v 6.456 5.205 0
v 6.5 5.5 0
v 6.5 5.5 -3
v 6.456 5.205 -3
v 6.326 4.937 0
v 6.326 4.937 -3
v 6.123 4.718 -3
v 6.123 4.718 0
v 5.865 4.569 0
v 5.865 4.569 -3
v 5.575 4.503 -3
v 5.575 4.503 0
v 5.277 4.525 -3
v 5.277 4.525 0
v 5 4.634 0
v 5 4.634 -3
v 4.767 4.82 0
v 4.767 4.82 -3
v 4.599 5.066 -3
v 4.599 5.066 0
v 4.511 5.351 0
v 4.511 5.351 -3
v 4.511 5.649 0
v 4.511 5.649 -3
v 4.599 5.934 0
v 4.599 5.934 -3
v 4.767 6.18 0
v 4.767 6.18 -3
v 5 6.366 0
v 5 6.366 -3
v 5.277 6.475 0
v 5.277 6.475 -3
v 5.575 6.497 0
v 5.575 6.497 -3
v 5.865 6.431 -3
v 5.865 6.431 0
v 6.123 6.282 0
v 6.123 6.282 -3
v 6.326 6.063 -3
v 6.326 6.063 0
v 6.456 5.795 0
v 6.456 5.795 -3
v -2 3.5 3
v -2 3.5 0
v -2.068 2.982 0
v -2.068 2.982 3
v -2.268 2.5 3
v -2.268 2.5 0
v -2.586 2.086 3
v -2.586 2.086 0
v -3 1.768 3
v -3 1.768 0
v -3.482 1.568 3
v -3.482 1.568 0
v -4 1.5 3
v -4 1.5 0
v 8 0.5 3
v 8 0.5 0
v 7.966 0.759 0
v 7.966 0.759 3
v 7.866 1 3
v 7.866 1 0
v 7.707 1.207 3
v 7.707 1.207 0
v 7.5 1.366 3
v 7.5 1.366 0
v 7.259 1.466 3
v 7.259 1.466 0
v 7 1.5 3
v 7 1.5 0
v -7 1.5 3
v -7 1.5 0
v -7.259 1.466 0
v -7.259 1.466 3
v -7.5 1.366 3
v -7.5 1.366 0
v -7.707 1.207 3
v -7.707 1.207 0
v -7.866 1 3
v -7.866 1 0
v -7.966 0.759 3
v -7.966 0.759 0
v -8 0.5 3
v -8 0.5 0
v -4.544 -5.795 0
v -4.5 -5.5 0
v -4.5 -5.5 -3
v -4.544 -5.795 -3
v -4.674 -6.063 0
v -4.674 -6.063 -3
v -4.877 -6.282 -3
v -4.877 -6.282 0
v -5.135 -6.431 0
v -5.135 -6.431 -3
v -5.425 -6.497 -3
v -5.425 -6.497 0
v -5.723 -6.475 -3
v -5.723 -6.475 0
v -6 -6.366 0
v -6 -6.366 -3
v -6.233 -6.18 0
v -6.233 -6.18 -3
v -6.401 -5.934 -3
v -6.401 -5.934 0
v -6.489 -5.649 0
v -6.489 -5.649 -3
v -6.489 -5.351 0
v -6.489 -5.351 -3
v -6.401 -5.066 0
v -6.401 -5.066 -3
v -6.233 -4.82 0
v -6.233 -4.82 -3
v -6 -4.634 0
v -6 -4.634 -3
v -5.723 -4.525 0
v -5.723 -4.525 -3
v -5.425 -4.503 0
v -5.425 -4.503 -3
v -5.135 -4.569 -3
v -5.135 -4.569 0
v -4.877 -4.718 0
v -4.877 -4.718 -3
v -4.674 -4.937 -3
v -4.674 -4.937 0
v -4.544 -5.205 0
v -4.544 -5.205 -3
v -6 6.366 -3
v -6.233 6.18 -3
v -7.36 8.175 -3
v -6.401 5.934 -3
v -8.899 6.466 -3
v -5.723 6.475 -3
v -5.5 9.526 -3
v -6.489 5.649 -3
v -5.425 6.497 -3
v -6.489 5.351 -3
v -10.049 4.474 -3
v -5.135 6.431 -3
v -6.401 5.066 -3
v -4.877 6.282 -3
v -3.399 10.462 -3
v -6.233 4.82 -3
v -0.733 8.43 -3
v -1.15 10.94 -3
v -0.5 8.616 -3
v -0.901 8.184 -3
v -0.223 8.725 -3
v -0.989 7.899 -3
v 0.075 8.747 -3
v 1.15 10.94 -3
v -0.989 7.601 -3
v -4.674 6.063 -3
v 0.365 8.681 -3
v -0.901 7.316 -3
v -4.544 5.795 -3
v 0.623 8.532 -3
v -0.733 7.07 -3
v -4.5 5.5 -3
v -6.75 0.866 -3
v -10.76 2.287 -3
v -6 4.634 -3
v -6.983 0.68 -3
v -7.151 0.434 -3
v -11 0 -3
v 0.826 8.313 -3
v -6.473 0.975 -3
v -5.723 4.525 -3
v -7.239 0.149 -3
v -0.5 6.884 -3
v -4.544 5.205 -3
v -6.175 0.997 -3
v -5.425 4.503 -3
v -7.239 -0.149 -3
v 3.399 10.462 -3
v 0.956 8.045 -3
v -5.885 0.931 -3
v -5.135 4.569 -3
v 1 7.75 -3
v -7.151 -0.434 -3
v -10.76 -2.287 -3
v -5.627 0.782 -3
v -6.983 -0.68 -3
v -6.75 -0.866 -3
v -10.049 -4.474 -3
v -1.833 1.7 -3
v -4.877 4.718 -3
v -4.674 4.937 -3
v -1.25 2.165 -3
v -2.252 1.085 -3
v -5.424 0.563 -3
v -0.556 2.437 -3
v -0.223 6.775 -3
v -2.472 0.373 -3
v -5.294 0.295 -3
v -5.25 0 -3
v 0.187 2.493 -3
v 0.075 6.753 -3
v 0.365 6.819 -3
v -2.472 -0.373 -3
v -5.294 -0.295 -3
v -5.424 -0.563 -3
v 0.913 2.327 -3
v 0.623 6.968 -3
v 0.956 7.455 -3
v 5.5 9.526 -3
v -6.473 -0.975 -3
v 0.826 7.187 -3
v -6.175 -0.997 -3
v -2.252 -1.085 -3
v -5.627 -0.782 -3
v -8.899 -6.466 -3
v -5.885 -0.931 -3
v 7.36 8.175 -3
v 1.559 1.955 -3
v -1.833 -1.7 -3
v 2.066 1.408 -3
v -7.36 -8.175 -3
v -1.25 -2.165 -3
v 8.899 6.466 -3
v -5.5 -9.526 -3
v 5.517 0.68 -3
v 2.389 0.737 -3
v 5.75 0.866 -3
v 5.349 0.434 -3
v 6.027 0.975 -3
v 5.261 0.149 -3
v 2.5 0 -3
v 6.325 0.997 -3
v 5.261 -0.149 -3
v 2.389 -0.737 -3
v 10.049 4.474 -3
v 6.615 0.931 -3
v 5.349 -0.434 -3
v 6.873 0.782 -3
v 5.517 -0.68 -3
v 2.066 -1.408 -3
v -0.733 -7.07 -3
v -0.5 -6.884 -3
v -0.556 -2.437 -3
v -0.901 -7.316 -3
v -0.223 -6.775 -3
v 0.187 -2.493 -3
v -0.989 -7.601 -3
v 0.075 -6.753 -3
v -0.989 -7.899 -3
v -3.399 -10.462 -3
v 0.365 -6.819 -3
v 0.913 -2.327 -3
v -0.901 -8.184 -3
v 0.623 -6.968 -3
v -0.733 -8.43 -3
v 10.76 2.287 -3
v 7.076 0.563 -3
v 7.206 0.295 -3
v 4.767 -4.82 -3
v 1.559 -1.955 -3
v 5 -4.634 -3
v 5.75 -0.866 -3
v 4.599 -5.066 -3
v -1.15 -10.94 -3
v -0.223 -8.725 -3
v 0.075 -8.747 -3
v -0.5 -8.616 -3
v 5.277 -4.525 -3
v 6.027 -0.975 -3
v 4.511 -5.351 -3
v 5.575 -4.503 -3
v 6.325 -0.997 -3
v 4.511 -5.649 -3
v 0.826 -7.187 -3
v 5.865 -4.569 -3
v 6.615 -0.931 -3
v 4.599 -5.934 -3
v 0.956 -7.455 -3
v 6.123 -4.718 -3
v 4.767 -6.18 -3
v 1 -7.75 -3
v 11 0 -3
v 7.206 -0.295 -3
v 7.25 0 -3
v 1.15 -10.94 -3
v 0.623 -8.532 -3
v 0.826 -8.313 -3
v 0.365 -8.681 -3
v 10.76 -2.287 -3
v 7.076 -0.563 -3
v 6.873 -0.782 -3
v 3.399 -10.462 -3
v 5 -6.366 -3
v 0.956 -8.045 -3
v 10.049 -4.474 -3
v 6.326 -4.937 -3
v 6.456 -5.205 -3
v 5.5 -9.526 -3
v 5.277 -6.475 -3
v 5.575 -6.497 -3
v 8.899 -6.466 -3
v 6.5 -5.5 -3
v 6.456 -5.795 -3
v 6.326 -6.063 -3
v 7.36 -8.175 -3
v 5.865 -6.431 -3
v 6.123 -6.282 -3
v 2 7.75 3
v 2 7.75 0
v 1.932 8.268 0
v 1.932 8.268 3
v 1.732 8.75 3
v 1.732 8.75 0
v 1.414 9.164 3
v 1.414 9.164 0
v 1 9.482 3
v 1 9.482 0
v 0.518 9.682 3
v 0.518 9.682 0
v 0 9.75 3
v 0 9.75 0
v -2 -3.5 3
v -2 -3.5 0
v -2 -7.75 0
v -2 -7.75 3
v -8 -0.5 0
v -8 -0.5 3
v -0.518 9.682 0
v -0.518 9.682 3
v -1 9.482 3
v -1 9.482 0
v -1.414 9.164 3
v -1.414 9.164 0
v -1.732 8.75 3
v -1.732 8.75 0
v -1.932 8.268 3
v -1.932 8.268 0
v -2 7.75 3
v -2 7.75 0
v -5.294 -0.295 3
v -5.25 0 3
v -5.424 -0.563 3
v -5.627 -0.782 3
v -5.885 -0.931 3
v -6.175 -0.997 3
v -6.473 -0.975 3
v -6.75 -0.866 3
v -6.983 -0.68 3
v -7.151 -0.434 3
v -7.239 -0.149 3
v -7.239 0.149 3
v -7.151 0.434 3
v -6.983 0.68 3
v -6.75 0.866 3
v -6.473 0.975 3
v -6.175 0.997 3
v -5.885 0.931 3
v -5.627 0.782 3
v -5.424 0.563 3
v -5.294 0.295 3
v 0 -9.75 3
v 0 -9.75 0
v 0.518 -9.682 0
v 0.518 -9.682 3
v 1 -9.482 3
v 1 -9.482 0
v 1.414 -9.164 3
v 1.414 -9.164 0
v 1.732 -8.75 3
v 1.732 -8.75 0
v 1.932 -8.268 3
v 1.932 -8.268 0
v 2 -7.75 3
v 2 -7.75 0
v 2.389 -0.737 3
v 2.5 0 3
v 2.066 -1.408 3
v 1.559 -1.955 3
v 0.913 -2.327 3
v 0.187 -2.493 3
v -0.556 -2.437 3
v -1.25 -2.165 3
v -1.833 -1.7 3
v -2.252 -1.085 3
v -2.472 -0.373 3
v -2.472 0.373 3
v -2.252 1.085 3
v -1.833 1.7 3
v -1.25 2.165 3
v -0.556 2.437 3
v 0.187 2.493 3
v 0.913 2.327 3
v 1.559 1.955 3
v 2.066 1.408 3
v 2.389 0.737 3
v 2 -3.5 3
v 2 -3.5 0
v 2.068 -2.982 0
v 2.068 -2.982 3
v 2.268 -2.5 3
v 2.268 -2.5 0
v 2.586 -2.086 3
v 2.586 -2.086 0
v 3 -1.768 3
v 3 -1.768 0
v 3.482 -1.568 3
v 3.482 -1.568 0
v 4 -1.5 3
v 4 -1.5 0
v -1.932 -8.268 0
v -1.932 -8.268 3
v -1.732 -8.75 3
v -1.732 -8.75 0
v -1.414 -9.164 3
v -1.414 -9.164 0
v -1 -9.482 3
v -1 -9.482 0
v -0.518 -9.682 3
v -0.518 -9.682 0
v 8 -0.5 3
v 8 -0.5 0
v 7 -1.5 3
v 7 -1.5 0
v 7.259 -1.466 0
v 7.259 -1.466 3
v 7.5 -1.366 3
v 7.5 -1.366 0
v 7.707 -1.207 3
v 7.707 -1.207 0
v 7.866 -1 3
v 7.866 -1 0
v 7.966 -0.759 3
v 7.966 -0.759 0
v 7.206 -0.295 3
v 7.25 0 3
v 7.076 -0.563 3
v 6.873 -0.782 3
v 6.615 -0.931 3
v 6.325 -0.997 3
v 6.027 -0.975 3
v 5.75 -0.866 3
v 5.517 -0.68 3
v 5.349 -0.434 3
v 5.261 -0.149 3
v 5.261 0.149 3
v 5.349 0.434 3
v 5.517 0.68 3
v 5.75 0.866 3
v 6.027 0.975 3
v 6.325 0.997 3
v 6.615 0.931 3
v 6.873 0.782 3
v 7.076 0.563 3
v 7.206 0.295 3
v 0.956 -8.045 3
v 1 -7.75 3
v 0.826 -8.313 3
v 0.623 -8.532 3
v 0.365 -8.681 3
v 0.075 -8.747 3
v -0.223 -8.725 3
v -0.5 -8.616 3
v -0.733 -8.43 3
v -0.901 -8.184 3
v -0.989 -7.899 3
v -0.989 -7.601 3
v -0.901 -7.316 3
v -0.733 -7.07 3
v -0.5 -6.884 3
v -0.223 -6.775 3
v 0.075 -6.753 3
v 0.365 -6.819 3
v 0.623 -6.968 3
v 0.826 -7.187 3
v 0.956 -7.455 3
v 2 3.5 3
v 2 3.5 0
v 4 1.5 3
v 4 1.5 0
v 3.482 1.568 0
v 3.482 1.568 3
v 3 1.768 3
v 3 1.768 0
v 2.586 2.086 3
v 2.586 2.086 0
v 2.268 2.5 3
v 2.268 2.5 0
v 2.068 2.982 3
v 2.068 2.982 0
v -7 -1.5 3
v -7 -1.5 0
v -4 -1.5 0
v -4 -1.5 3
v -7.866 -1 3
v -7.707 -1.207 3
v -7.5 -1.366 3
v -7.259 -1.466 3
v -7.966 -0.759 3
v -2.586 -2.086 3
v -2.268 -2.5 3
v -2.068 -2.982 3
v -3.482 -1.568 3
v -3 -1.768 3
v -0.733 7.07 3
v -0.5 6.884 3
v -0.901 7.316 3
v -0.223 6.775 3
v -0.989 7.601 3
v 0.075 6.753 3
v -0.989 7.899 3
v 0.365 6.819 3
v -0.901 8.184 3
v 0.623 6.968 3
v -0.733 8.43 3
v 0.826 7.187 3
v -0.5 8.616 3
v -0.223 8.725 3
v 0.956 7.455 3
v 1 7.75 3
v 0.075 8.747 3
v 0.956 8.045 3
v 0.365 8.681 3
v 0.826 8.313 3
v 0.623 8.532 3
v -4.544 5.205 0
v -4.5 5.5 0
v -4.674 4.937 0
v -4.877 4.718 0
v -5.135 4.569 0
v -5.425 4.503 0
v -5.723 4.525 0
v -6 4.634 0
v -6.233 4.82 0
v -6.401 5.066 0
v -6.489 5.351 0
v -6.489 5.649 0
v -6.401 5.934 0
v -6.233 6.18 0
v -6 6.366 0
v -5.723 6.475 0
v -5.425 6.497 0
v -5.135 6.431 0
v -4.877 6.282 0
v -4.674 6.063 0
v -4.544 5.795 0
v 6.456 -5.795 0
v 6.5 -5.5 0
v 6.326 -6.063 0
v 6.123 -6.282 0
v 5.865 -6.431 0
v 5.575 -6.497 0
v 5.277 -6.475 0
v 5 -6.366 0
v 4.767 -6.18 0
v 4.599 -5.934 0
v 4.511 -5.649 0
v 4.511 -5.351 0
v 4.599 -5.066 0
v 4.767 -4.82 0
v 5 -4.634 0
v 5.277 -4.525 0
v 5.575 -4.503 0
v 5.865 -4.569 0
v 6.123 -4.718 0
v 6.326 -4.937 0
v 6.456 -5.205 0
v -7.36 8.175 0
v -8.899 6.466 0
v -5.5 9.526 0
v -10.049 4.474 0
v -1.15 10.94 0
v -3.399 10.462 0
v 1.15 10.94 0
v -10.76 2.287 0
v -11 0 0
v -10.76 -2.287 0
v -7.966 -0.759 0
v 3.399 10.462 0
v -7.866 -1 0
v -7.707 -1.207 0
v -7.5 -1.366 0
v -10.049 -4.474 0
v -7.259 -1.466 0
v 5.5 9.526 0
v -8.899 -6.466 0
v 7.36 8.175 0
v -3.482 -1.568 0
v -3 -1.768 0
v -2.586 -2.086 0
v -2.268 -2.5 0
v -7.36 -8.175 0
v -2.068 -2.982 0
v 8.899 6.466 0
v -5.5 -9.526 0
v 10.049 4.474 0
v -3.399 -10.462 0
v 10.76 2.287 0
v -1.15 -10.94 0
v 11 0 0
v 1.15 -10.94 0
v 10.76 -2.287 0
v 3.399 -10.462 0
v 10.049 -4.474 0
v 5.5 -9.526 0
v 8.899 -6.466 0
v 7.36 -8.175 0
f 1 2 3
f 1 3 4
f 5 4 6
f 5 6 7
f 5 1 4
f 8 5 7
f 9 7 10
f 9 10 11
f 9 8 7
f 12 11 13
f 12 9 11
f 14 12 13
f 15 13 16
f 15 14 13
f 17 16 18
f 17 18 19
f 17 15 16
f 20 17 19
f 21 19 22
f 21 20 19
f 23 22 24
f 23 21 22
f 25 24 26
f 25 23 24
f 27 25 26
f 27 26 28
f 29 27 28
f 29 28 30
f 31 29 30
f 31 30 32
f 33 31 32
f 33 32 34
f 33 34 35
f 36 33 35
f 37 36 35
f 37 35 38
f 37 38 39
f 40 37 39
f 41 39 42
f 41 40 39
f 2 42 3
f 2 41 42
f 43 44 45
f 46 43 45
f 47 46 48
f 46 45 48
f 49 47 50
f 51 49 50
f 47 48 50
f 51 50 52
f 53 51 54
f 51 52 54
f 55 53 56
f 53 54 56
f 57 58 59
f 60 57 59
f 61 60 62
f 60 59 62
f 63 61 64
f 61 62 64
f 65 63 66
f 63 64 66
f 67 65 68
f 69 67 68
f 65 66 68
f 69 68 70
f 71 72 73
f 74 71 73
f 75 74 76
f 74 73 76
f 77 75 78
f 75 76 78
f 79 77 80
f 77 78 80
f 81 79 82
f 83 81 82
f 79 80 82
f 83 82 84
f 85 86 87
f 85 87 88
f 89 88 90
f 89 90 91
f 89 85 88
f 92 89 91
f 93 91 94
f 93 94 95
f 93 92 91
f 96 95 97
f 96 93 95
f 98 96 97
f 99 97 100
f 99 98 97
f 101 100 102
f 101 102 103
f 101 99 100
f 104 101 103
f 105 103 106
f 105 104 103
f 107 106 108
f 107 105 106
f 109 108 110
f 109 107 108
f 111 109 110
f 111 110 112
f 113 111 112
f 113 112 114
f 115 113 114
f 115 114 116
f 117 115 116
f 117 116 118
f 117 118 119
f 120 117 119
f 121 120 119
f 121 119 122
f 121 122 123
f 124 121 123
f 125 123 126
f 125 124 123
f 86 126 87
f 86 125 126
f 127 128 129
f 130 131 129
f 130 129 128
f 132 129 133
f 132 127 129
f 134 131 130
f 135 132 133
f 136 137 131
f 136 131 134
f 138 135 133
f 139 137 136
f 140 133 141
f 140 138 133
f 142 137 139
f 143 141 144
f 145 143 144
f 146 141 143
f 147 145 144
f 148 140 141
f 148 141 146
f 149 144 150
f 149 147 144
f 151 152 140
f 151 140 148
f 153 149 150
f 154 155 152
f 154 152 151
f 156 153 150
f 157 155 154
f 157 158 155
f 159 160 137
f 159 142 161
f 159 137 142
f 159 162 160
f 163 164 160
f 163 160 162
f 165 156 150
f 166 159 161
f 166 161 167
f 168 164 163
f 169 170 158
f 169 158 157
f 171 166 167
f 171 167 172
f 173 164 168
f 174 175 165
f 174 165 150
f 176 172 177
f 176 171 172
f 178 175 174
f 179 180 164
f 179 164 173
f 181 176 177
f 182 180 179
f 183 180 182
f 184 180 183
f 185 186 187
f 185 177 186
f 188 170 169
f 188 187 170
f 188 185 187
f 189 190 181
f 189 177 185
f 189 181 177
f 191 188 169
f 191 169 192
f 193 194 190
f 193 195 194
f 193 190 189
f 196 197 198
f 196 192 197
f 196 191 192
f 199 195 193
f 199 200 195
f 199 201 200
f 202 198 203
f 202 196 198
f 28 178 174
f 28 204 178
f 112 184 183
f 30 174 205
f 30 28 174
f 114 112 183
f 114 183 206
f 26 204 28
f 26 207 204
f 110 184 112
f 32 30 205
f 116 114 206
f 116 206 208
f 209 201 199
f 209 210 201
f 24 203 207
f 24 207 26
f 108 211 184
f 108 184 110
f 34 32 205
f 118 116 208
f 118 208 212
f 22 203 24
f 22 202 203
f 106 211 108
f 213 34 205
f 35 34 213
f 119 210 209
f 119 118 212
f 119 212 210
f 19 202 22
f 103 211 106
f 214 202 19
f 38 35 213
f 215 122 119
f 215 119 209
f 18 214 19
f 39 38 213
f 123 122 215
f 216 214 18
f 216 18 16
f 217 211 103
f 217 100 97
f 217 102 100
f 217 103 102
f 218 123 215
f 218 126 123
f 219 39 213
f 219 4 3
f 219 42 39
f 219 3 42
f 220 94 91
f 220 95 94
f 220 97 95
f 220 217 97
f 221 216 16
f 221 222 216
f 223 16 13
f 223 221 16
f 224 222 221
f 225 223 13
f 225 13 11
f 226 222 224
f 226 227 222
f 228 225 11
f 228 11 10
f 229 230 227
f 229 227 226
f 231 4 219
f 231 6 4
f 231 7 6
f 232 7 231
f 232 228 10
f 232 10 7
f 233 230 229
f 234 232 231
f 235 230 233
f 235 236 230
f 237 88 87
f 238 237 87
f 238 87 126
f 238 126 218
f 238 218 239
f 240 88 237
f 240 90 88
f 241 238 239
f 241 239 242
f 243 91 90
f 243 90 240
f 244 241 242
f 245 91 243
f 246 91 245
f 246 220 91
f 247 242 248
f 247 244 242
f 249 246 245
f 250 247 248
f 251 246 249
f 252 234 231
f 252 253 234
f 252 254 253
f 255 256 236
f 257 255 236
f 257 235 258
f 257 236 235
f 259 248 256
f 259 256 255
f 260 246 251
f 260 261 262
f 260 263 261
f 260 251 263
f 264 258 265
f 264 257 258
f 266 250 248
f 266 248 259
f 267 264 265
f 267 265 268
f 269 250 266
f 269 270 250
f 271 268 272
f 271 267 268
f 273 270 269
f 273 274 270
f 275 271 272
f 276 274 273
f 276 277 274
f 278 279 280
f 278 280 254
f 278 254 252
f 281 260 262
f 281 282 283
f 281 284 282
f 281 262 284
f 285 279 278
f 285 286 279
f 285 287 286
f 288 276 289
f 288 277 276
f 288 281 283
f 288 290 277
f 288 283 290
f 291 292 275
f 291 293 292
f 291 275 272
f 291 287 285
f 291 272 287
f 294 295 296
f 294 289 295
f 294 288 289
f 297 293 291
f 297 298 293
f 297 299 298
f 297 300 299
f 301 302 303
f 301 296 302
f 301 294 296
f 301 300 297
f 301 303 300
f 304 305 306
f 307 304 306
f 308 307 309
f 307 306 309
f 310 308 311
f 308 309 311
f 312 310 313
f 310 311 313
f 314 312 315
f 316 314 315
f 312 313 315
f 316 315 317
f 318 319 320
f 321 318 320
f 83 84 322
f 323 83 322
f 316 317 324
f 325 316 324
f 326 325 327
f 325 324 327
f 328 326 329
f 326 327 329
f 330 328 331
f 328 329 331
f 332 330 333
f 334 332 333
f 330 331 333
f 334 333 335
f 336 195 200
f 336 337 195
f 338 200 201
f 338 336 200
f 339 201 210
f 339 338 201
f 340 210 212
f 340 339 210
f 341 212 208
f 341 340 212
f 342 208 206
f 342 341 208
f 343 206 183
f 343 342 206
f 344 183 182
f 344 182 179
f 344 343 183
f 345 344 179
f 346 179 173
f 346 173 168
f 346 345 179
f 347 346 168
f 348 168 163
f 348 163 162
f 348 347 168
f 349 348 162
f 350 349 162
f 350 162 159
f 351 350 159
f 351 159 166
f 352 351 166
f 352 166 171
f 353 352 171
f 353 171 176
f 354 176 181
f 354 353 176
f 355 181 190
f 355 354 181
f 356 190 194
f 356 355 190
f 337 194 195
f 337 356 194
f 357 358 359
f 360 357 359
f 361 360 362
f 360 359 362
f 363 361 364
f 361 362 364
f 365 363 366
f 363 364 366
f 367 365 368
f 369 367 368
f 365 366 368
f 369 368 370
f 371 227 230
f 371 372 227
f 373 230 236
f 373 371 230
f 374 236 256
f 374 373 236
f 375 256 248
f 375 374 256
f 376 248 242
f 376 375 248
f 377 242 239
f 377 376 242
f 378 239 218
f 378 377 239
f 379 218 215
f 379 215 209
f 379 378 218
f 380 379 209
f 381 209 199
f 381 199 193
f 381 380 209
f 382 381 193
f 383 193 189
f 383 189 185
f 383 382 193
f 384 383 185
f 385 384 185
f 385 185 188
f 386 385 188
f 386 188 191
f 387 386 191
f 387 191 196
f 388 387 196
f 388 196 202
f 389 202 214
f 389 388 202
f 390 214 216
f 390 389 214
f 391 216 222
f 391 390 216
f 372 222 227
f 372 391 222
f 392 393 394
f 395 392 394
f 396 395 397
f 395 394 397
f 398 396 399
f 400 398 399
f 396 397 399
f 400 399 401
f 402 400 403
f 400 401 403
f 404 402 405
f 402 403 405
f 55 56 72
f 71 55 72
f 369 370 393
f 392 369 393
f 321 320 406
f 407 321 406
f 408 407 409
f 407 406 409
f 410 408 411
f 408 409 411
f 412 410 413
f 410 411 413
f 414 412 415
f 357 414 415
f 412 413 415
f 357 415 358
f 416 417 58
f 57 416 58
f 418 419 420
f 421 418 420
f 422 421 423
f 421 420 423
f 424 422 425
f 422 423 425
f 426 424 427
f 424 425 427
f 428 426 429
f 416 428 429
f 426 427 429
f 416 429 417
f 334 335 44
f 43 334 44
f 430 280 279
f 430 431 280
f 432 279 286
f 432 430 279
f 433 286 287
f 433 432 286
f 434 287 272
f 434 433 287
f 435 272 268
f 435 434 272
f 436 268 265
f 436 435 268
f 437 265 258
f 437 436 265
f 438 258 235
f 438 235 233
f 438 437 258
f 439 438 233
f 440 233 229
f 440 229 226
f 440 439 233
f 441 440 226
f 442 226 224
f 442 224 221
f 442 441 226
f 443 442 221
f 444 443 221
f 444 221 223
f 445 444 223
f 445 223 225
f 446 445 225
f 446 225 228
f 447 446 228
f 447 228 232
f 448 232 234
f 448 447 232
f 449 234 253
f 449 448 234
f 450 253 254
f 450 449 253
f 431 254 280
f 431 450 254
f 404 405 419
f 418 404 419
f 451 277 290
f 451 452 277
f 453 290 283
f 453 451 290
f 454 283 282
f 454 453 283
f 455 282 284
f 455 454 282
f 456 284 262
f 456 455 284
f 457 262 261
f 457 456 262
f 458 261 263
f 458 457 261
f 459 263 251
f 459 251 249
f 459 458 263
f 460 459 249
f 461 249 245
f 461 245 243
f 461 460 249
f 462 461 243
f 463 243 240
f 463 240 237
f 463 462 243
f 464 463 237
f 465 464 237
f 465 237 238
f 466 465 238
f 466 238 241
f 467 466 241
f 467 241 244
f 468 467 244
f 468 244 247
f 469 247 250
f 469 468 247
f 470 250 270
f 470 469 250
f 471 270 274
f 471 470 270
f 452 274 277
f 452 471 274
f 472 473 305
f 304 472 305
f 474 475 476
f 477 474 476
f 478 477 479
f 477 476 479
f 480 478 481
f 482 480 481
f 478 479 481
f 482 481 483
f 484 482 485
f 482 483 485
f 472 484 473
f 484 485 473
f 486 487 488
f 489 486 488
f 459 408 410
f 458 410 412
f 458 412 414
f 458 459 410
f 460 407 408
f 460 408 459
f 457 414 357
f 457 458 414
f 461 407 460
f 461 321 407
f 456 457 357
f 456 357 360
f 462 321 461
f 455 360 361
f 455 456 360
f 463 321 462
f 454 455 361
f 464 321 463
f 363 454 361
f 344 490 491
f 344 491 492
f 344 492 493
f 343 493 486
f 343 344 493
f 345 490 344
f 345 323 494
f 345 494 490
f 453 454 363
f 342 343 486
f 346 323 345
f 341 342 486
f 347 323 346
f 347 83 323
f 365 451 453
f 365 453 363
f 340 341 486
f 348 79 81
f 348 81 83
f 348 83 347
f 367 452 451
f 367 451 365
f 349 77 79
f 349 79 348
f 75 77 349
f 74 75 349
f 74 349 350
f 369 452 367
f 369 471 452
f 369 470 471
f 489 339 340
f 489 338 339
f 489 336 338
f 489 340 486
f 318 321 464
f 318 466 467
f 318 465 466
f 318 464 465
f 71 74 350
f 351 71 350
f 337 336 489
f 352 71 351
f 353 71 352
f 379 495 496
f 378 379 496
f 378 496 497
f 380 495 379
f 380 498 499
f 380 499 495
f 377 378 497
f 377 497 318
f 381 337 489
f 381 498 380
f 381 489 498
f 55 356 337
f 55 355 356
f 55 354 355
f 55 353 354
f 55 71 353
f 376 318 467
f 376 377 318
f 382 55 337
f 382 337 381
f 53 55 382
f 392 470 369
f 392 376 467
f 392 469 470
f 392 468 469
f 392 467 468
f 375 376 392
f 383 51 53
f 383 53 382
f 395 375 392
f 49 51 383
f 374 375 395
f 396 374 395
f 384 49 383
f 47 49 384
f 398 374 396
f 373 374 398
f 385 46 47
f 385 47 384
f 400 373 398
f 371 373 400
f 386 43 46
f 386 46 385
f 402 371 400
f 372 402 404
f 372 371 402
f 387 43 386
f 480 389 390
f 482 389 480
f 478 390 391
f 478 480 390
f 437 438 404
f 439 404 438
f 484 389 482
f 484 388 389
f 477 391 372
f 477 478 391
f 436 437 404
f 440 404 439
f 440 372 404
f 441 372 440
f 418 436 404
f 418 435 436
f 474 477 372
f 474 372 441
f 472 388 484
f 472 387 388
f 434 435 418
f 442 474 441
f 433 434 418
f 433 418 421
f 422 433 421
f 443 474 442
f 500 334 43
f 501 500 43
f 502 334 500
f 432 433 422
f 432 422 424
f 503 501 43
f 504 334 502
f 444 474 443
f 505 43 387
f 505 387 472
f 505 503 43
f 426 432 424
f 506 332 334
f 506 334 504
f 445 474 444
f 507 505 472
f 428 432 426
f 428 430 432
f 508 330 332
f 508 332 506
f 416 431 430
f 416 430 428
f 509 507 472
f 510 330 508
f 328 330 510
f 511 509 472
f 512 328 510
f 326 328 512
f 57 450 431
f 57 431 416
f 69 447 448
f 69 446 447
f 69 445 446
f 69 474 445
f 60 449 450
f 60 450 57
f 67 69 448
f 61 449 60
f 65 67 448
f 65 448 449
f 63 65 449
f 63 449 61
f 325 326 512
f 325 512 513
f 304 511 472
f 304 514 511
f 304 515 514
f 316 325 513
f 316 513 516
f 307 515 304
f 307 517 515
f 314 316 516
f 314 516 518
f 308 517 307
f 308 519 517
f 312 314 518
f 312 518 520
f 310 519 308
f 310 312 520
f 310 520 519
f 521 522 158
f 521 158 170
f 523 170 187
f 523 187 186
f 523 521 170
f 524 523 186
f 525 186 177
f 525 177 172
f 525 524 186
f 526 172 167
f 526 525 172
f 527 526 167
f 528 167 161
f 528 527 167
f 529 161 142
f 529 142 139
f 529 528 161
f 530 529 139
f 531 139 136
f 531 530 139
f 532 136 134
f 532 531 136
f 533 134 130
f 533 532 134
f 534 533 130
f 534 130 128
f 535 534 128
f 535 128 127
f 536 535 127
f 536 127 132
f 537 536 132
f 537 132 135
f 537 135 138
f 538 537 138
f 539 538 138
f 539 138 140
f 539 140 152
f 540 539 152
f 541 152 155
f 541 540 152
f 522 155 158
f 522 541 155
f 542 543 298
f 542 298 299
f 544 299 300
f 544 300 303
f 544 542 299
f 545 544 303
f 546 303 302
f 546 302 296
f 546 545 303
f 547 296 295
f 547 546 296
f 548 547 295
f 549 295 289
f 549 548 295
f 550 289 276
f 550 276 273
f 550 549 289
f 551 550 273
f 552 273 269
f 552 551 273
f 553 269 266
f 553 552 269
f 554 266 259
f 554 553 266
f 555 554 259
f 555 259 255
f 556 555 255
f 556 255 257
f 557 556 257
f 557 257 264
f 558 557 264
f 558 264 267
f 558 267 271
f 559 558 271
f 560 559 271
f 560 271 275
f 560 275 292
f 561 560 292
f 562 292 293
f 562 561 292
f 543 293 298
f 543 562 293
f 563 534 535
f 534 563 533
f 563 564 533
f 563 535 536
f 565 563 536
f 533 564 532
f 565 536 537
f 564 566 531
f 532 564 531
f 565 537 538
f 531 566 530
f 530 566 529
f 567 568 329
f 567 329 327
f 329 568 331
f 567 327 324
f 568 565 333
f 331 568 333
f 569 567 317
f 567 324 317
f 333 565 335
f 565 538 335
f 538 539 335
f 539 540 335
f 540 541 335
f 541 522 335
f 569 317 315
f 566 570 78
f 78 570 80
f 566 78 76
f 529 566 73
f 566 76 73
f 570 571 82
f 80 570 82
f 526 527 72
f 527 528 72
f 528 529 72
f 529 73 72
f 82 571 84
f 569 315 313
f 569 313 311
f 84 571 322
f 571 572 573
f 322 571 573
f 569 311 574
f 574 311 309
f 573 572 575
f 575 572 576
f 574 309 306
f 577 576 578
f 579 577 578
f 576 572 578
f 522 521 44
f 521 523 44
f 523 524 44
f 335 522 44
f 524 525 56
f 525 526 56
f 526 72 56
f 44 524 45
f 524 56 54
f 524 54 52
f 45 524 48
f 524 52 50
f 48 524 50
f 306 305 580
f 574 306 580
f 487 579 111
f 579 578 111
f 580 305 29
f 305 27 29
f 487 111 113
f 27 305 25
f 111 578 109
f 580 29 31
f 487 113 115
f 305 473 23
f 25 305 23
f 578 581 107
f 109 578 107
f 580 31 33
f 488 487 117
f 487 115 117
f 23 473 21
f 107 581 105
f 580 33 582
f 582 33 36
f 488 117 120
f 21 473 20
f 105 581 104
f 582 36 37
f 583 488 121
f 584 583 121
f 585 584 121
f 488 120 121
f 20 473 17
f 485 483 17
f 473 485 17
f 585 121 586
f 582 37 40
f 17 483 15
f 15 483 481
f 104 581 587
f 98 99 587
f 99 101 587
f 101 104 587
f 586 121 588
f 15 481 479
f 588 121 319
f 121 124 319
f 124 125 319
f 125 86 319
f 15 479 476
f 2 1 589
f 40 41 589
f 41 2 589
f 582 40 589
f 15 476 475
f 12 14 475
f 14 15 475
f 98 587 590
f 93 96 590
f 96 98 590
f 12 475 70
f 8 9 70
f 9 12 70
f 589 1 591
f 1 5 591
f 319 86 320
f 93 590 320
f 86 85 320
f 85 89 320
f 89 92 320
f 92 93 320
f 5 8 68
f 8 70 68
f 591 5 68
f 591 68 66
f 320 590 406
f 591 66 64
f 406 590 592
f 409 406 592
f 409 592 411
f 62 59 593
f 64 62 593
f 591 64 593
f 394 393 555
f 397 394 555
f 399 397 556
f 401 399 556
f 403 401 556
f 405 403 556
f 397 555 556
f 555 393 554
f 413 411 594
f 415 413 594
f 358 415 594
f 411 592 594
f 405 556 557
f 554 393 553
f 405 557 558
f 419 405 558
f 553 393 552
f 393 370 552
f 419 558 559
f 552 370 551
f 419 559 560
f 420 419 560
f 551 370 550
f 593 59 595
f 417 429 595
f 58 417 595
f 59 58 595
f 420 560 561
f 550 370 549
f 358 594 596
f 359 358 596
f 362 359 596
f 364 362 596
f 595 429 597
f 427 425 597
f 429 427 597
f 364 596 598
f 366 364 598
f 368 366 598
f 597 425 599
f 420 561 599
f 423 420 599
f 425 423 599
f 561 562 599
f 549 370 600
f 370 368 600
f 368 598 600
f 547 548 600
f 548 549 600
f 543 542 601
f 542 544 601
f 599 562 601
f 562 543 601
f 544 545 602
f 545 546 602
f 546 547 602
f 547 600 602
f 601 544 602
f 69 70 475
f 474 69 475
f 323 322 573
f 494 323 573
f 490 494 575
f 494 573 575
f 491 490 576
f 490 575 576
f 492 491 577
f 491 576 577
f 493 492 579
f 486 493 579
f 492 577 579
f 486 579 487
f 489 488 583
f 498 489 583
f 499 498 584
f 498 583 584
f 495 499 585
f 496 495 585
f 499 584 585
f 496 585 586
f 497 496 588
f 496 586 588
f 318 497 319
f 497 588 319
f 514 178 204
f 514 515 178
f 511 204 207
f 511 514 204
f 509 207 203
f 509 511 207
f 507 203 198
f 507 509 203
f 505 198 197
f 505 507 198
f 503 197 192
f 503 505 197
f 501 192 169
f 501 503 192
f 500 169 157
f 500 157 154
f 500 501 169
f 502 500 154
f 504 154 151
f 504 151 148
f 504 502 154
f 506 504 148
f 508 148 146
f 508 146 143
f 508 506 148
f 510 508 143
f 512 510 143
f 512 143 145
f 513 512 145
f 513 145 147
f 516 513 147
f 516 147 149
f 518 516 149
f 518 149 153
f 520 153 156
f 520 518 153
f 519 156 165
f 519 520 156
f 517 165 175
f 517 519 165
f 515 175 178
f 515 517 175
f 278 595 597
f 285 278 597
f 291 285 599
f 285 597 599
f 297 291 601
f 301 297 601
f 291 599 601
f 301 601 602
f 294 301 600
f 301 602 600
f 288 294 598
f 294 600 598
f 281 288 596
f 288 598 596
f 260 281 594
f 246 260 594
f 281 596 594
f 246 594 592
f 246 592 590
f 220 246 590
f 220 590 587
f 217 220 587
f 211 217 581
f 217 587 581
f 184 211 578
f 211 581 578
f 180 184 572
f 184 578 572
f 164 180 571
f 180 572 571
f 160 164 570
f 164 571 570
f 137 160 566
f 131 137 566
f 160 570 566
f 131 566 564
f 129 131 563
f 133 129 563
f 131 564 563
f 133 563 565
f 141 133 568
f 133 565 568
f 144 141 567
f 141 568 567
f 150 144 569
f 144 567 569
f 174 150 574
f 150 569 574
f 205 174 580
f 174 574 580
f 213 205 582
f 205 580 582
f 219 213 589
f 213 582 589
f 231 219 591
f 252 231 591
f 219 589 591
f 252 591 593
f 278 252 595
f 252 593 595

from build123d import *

# Parameters (mm, degrees)
F0_R     = 1
F0_R_2   = 2.5
F1_DEPTH = 3
F2_R     = 11
F2_R_2   = 1
F2_R_3   = 2.5
F3_DEPTH = 3


with BuildPart() as f1:
    # F0 (on Top) → F1 (new body)
    with BuildSketch(Plane.XY):
        with BuildLine():
            ThreePointArc((4, 1.5), (2.5857864376, 2.0857864376), (2, 3.5))
            Line((2, 3.5), (2, 7.75))
            ThreePointArc((2, 7.75), (1.4142135624, 9.1642135624), (0, 9.75))
            ThreePointArc((0, 9.75), (-1.4142135624, 9.1642135624), (-2, 7.75))
            Line((-2, 7.75), (-2, 3.5))
            ThreePointArc((-2, 3.5), (-2.5857864376, 2.0857864376), (-4, 1.5))
            Line((-4, 1.5), (-7, 1.5))
            ThreePointArc((-7, 1.5), (-7.7071067812, 1.2071067812), (-8, 0.5))
            Line((-8, 0.5), (-8, -0.5))
            ThreePointArc((-8, -0.5), (-7.7071067812, -1.2071067812), (-7, -1.5))
            Line((-7, -1.5), (-4, -1.5))
            ThreePointArc((-4, -1.5), (-2.5857864376, -2.0857864376), (-2, -3.5))
            Line((-2, -3.5), (-2, -7.75))
            ThreePointArc((-2, -7.75), (-1.4142135624, -9.1642135624), (0, -9.75))
            ThreePointArc((0, -9.75), (1.4142135624, -9.1642135624), (2, -7.75))
            Line((2, -7.75), (2, -3.5))
            ThreePointArc((2, -3.5), (2.5857864376, -2.0857864376), (4, -1.5))
            Line((4, -1.5), (7, -1.5))
            ThreePointArc((7, -1.5), (7.7071067812, -1.2071067812), (8, -0.5))
            Line((8, -0.5), (8, 0.5))
            ThreePointArc((8, 0.5), (7.7071067812, 1.2071067812), (7, 1.5))
            Line((7, 1.5), (4, 1.5))
        make_face()
        with Locations((0, -7.75)):
            Circle(F0_R, mode=Mode.SUBTRACT)
        with Locations((-6.25, 0)):
            Circle(F0_R, mode=Mode.SUBTRACT)
        Circle(F0_R_2, mode=Mode.SUBTRACT)
        with Locations((6.25, 0)):
            Circle(F0_R, mode=Mode.SUBTRACT)
        with Locations((0, 7.75)):
            Circle(F0_R, mode=Mode.SUBTRACT)
    extrude(amount=F1_DEPTH)

    # F2 (on face) → F3 (join)
    with BuildSketch(Plane(origin=(0, 0, 0), x_dir=(1, 0, 0), z_dir=(0, 0, -1))):
        Circle(F2_R)
        with Locations((-5.5, -5.5)):
            Circle(F2_R_2, mode=Mode.SUBTRACT)
        with Locations((5.5, -5.5)):
            Circle(F2_R_2, mode=Mode.SUBTRACT)
        with Locations((-5.5, 5.5)):
            Circle(F2_R_2, mode=Mode.SUBTRACT)
        with BuildLine():
            ThreePointArc((-2, 7.75), (0, 9.75), (2, 7.75))
            Line((2, 7.75), (2, 3.5))
            ThreePointArc((2, 3.5), (2.5857864376, 2.0857864376), (4, 1.5))
            Line((4, 1.5), (7, 1.5))
            ThreePointArc((7, 1.5), (7.7071067812, 1.2071067812), (8, 0.5))
            Line((8, 0.5), (8, -0.5))
            ThreePointArc((8, -0.5), (7.7071067812, -1.2071067812), (7, -1.5))
            Line((7, -1.5), (4, -1.5))
            ThreePointArc((4, -1.5), (2.5857864376, -2.0857864376), (2, -3.5))
            Line((2, -3.5), (2, -7.75))
            ThreePointArc((2, -7.75), (0, -9.75), (-2, -7.75))
            Line((-2, -7.75), (-2, -3.5))
            ThreePointArc((-2, -3.5), (-2.5857864376, -2.0857864376), (-4, -1.5))
            Line((-4, -1.5), (-7, -1.5))
            ThreePointArc((-7, -1.5), (-7.7071067812, -1.2071067812), (-8, -0.5))
            Line((-8, -0.5), (-8, 0.5))
            ThreePointArc((-8, 0.5), (-7.7071067812, 1.2071067812), (-7, 1.5))
            Line((-7, 1.5), (-4, 1.5))
            ThreePointArc((-4, 1.5), (-2.5857864376, 2.0857864376), (-2, 3.5))
            Line((-2, 3.5), (-2, 7.75))
        make_face(mode=Mode.SUBTRACT)
        with Locations((5.5, 5.5)):
            Circle(F2_R_2, mode=Mode.SUBTRACT)
        with BuildLine():
            Line((2, 3.5), (2, 7.75))
            ThreePointArc((2, 7.75), (0, 9.75), (-2, 7.75))
            Line((-2, 7.75), (-2, 3.5))
            ThreePointArc((-2, 3.5), (-2.5857864376, 2.0857864376), (-4, 1.5))
            Line((-4, 1.5), (-7, 1.5))
            ThreePointArc((-7, 1.5), (-7.7071067812, 1.2071067812), (-8, 0.5))
            Line((-8, 0.5), (-8, -0.5))
            ThreePointArc((-8, -0.5), (-7.7071067812, -1.2071067812), (-7, -1.5))
            Line((-7, -1.5), (-4, -1.5))
            ThreePointArc((-4, -1.5), (-2.5857864376, -2.0857864376), (-2, -3.5))
            Line((-2, -3.5), (-2, -7.75))
            ThreePointArc((-2, -7.75), (0, -9.75), (2, -7.75))
            Line((2, -7.75), (2, -3.5))
            ThreePointArc((2, -3.5), (2.5857864376, -2.0857864376), (4, -1.5))
            Line((4, -1.5), (7, -1.5))
            ThreePointArc((7, -1.5), (7.7071067812, -1.2071067812), (8, -0.5))
            Line((8, -0.5), (8, 0.5))
            ThreePointArc((8, 0.5), (7.7071067812, 1.2071067812), (7, 1.5))
            Line((7, 1.5), (4, 1.5))
            ThreePointArc((4, 1.5), (2.5857864376, 2.0857864376), (2, 3.5))
        make_face()
        with Locations((0, -7.75)):
            Circle(F2_R_2, mode=Mode.SUBTRACT)
        with Locations((-6.25, 0)):
            Circle(F2_R_2, mode=Mode.SUBTRACT)
        Circle(F2_R_3, mode=Mode.SUBTRACT)
        with Locations((6.25, 0)):
            Circle(F2_R_2, mode=Mode.SUBTRACT)
        with Locations((0, 7.75)):
            Circle(F2_R_2, mode=Mode.SUBTRACT)
    extrude(amount=F3_DEPTH)


solid = f1.part
